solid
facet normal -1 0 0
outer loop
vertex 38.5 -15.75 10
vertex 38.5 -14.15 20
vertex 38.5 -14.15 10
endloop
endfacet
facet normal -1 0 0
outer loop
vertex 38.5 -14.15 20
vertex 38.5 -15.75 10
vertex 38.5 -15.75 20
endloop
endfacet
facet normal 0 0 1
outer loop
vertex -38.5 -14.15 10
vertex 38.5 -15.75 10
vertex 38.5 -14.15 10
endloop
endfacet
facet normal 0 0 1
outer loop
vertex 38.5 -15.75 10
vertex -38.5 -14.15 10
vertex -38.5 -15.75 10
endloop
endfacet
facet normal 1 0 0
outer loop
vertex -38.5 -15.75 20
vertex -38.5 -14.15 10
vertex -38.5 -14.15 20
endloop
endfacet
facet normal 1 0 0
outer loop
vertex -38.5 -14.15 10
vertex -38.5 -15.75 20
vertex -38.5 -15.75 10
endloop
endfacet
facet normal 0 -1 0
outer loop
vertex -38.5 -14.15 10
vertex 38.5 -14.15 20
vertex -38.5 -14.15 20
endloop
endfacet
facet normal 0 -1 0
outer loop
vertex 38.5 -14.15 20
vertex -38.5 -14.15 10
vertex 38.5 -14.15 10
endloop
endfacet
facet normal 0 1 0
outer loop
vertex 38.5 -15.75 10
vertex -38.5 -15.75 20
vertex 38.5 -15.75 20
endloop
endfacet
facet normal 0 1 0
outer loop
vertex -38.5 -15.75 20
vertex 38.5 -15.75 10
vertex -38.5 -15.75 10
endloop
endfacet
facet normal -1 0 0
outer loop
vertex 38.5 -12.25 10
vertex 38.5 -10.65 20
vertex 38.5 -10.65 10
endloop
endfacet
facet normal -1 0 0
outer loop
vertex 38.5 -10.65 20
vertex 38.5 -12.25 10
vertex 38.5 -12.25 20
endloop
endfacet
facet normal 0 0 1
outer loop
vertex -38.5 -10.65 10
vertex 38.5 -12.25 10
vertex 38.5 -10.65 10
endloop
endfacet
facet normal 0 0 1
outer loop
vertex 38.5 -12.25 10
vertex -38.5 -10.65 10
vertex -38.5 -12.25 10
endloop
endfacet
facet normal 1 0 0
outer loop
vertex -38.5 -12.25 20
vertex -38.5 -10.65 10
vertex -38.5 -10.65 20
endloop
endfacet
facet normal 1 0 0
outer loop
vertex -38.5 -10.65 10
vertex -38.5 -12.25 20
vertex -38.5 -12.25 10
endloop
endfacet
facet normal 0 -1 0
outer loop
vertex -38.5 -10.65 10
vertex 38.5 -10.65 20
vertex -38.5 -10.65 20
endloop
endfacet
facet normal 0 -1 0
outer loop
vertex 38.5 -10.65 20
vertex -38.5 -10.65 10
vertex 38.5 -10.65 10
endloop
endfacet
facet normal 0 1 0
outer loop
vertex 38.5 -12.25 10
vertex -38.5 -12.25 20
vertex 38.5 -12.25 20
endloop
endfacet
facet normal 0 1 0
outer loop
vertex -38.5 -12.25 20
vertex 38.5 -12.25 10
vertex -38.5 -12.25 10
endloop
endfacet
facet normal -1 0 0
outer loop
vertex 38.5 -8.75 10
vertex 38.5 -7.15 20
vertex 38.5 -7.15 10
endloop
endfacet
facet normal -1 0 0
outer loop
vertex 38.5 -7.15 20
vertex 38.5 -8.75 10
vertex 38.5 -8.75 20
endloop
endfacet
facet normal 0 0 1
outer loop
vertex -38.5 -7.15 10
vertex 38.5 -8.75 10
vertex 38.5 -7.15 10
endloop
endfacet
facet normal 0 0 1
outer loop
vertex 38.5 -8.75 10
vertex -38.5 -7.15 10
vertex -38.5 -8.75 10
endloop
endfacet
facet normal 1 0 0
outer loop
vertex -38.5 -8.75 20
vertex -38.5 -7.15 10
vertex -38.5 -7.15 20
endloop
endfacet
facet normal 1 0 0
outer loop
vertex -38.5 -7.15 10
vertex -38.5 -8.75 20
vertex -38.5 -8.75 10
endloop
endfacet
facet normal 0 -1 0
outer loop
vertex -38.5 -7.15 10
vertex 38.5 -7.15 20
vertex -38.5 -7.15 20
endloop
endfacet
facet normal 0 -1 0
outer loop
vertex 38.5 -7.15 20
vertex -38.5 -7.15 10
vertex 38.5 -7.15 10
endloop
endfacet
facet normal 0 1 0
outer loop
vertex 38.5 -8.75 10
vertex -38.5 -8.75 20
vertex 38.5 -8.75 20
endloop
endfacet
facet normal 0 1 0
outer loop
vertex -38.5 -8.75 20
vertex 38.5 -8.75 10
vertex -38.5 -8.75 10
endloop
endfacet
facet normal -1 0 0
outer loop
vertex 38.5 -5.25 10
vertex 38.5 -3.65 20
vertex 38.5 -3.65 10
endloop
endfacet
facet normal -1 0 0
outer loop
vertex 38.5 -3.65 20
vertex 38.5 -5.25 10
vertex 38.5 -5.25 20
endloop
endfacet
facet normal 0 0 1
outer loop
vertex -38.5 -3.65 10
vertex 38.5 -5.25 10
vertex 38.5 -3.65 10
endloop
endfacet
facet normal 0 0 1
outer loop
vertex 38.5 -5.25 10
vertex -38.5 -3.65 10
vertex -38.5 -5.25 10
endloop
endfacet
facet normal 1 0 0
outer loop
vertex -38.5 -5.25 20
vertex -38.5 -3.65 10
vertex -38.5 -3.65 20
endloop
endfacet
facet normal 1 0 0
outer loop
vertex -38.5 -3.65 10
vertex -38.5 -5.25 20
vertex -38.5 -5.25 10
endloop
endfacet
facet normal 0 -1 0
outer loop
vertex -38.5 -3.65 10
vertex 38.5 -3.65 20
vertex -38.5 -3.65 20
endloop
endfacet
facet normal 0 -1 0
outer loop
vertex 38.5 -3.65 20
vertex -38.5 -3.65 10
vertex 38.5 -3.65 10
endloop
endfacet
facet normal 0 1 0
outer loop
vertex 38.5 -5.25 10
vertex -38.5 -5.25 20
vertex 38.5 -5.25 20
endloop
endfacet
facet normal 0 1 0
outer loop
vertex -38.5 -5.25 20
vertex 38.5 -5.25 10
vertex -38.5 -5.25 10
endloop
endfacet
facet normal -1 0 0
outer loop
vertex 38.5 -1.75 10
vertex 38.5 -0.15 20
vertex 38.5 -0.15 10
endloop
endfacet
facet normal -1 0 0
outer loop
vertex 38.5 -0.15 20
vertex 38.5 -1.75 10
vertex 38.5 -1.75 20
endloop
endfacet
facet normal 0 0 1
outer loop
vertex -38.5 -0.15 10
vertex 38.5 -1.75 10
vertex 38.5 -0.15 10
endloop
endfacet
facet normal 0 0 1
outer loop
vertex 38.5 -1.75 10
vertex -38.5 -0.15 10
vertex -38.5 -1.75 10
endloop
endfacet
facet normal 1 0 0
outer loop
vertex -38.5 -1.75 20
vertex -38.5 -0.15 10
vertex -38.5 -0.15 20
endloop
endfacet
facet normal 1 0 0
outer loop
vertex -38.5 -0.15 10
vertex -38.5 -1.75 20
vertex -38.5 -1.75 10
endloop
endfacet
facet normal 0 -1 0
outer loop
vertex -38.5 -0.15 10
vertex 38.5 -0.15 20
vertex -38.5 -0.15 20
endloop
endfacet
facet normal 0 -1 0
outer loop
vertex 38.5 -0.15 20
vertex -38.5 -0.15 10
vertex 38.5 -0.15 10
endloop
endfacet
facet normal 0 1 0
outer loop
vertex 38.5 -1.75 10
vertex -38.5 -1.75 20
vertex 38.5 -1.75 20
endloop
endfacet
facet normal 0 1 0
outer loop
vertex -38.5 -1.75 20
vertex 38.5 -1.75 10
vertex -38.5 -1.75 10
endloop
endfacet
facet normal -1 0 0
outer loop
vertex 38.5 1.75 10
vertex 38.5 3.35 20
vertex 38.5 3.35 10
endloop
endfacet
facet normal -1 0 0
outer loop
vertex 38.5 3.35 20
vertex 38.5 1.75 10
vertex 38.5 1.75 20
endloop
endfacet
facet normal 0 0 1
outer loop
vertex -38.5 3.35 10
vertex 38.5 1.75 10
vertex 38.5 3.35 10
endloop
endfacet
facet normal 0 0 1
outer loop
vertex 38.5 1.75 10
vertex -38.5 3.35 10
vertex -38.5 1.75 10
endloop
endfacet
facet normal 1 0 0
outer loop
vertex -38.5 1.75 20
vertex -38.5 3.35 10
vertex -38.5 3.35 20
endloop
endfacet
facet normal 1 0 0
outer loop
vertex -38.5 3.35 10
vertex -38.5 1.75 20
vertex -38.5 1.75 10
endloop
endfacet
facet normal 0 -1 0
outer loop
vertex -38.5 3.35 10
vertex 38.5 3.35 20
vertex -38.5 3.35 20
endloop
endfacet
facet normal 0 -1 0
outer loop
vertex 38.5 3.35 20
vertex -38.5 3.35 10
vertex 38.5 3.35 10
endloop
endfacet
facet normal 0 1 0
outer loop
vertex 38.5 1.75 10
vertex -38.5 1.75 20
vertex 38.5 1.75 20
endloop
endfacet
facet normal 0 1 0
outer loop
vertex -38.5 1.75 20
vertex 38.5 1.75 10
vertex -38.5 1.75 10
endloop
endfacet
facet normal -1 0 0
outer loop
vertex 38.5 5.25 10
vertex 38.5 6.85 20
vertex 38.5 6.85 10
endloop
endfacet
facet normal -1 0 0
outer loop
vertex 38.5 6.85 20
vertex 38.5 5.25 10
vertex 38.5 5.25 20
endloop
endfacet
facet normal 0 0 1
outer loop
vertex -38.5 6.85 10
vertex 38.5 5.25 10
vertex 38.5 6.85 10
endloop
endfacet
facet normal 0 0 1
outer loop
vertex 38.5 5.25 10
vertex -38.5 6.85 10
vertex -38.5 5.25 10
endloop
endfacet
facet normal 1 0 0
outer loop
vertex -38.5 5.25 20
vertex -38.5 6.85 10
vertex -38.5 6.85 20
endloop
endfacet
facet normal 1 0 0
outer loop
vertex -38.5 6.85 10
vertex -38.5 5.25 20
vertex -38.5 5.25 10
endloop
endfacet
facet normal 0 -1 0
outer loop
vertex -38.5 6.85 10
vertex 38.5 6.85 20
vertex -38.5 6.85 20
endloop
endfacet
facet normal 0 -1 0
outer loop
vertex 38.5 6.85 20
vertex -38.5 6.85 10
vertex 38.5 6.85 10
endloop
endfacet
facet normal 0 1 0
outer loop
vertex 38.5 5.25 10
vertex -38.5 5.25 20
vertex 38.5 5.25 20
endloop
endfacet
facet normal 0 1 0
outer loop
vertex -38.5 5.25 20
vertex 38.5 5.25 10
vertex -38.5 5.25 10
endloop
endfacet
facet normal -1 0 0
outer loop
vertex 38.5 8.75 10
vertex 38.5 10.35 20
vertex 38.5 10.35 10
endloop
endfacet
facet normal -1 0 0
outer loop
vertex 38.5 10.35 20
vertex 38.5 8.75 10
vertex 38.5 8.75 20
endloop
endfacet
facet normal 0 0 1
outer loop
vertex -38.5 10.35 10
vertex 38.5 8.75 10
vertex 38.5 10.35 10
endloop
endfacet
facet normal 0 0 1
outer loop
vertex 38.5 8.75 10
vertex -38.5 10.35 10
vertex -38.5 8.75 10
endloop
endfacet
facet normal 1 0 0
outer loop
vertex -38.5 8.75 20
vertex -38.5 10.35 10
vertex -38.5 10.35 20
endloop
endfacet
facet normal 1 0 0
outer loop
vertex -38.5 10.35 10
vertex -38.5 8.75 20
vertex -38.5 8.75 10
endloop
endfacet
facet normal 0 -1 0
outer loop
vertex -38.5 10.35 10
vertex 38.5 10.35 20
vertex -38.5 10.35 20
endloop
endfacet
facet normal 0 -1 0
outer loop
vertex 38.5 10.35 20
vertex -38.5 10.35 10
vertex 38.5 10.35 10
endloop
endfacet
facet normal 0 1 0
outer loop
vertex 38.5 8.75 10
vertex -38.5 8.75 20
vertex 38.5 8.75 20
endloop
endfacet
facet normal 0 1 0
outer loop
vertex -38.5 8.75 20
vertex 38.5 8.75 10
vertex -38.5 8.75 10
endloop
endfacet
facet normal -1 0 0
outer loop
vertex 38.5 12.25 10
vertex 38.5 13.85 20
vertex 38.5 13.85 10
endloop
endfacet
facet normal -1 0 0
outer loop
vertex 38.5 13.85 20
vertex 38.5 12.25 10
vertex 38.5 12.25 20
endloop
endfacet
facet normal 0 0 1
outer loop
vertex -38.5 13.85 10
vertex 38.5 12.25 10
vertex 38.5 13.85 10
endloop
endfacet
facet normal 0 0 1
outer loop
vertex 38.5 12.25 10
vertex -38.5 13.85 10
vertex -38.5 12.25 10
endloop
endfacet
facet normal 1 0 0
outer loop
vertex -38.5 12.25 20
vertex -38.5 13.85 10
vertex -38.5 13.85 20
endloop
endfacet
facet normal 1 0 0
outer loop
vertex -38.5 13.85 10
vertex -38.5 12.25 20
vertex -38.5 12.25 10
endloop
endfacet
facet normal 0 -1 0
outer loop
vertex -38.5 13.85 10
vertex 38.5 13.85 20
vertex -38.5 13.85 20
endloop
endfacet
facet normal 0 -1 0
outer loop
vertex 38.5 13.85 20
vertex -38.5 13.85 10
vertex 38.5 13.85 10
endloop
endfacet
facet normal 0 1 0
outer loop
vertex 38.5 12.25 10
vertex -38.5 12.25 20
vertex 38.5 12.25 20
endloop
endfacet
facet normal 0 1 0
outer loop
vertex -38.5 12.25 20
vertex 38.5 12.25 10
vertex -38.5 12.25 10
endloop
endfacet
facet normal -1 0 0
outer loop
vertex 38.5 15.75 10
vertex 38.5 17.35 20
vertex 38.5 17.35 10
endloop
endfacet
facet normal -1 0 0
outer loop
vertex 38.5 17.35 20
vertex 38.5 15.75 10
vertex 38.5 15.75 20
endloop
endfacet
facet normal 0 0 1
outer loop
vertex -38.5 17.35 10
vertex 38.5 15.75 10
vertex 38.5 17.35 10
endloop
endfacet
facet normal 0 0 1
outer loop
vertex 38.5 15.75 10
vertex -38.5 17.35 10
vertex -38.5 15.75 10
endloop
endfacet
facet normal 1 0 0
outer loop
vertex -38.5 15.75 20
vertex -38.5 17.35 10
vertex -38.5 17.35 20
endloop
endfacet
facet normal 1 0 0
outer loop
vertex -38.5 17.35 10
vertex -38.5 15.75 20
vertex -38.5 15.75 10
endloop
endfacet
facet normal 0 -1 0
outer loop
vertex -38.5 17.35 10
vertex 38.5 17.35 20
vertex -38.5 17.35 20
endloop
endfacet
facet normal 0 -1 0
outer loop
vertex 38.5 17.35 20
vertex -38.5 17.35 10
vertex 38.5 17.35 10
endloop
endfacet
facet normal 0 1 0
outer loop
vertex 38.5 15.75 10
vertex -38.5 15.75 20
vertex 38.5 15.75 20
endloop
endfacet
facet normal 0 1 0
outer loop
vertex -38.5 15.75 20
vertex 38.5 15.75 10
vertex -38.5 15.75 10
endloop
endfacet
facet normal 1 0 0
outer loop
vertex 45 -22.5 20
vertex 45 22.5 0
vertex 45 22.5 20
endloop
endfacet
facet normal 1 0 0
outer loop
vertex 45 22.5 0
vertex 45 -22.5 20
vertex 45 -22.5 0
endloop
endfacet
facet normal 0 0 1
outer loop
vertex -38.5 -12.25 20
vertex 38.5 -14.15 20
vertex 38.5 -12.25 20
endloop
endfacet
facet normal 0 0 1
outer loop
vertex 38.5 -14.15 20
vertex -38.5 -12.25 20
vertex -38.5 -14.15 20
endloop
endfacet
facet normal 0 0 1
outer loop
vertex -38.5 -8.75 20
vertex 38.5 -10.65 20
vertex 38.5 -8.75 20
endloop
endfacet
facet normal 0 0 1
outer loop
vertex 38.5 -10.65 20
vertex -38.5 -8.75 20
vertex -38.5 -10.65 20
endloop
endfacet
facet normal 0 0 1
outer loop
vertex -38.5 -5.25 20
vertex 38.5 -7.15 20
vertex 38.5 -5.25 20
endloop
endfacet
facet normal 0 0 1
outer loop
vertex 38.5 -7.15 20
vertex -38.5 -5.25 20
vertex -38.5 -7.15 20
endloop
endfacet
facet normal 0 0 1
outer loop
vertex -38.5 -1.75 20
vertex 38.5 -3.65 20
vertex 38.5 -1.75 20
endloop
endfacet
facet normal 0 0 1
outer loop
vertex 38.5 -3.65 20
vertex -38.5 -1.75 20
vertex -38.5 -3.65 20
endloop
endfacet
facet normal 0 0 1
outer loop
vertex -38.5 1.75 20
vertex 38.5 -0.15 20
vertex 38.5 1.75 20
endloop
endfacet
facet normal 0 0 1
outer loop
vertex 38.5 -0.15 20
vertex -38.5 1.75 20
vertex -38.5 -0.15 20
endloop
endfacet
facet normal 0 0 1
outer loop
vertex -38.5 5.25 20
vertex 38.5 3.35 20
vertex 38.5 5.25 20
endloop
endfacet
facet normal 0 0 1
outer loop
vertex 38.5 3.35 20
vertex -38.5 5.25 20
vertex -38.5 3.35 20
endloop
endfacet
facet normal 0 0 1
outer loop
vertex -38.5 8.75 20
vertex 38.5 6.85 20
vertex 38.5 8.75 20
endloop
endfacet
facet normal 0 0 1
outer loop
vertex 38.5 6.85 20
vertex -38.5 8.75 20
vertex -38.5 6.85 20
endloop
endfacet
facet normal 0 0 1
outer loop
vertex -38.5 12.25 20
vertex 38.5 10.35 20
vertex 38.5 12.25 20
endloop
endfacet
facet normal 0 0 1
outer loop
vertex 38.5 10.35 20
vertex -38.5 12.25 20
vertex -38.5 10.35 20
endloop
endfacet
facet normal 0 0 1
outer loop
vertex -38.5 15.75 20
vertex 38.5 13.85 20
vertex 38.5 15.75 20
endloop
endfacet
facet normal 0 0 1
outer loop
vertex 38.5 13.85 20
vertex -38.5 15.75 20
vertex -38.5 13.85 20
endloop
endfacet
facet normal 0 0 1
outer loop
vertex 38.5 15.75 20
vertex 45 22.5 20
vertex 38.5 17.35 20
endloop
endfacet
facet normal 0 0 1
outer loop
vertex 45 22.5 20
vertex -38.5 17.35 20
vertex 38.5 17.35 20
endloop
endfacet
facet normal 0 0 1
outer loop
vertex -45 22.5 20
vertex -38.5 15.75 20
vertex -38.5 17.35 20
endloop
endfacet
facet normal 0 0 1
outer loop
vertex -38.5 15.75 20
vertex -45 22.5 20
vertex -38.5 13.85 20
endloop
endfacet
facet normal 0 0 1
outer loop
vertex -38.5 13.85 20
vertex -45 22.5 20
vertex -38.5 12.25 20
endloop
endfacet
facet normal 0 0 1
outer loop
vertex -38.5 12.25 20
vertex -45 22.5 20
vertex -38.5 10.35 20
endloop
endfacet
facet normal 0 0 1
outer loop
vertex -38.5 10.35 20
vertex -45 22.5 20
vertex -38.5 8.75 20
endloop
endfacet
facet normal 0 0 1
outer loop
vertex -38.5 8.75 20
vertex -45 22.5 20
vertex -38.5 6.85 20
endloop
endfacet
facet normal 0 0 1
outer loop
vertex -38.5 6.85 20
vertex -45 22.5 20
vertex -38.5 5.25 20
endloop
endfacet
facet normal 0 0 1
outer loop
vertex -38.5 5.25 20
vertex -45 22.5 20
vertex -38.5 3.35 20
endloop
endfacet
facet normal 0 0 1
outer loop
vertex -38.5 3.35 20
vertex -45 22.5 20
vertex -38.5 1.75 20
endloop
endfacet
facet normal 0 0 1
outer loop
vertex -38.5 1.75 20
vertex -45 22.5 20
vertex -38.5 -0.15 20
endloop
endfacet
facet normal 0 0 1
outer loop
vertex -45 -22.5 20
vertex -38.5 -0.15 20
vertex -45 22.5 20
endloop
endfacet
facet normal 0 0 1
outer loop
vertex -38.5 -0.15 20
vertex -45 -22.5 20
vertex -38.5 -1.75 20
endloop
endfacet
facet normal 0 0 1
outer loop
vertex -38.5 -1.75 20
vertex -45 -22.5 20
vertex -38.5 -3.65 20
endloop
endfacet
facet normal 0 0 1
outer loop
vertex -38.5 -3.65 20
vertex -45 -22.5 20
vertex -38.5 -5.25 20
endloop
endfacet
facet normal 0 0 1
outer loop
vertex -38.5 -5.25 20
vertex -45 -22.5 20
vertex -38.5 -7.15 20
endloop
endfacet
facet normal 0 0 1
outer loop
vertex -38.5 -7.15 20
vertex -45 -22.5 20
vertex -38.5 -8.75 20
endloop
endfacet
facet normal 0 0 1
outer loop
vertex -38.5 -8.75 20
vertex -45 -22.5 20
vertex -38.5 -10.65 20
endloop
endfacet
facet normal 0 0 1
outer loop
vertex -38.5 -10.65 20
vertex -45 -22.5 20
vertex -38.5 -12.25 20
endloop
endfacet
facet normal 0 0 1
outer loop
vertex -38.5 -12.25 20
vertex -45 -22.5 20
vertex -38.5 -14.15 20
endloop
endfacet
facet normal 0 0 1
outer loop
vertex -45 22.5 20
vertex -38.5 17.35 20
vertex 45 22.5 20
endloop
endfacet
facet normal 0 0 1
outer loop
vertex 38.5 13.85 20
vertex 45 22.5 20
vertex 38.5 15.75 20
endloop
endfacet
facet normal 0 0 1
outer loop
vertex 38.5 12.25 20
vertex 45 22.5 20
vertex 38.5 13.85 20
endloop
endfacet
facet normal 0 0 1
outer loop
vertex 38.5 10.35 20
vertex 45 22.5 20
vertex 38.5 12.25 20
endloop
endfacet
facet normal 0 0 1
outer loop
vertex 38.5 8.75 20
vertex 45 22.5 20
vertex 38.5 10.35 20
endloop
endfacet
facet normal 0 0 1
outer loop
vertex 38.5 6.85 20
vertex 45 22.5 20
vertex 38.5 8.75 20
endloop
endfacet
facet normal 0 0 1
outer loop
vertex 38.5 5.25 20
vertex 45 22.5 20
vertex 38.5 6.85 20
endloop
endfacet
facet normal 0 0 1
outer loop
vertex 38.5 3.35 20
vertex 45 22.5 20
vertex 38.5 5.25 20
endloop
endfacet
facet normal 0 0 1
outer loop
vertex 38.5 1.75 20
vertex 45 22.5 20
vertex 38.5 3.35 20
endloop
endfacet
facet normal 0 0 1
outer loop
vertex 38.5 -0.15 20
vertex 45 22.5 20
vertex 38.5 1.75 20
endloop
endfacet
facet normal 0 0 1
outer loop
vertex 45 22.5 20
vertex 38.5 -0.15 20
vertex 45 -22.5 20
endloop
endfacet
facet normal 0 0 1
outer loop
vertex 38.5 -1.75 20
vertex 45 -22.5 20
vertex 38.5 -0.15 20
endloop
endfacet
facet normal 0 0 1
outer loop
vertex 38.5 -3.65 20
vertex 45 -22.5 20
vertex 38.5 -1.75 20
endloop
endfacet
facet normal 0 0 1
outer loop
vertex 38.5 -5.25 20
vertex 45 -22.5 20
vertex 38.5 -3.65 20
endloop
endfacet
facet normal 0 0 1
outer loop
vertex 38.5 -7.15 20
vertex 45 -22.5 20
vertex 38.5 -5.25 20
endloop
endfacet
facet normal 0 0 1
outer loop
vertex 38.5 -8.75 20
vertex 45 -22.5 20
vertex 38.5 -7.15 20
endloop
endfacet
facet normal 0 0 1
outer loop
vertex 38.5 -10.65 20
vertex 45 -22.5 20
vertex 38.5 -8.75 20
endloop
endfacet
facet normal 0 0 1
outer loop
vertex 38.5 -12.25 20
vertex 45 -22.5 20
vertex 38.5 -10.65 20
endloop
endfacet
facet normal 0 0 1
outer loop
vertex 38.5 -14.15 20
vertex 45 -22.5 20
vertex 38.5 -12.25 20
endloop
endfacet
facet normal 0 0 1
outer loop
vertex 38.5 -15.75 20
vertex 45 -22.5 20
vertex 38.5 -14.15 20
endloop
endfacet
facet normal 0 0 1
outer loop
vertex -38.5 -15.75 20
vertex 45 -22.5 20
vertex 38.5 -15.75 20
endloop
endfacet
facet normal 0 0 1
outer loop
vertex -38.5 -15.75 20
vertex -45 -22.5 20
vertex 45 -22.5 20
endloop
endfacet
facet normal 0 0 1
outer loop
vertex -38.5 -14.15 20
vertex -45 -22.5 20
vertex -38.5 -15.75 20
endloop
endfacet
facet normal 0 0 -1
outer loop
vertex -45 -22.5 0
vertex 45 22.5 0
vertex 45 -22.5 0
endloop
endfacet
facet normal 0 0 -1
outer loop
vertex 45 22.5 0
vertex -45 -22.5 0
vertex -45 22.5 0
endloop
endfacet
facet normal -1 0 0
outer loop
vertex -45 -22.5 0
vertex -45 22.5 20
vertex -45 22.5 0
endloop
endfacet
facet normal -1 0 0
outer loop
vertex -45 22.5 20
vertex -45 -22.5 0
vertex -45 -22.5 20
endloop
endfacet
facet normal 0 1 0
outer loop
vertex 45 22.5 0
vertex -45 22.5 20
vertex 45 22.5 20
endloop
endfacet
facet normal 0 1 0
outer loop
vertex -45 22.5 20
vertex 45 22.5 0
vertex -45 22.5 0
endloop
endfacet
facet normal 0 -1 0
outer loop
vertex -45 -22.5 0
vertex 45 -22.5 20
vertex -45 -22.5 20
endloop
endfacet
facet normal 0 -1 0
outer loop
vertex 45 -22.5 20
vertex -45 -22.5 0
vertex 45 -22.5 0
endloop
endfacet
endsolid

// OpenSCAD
// Microscope slide drying rack
// Print orientation: base block on the bed, slots open upward (+Z)

// ---------------- Parameters ----------------
block_len    = 90;    // base block length along X (mm)
block_wid    = 45;    // base block width along Y (mm)
block_h      = 20;    // base block height along Z (mm)

slot_len     = 77;    // slot length along X (mm)
slot_w       = 1.6;   // slot width along Y (mm)
slot_depth   = 10;    // slot depth from top face (mm)
slot_count   = 10;    // number of slots
slot_pitch   = 3.5;   // centre-to-centre slot spacing along Y (mm)

eps          = 0.5;   // overshoot of cutters past the top face (mm)

$fn = 64;

// ---------------- Model ----------------
difference() {
    // Base block, centred in X and Y, sitting on z = 0
    translate([-block_len/2, -block_wid/2, 0])
        cube([block_len, block_wid, block_h]);

    // Slot group, centred on the block in X and Y
    for (i = [0 : slot_count - 1]) {
        y = (i - (slot_count - 1)/2) * slot_pitch;
        translate([-slot_len/2, y, block_h - slot_depth])
            // slot runs along X, open at the top
            cube([slot_len, slot_w, slot_depth + eps]);
    }
}
